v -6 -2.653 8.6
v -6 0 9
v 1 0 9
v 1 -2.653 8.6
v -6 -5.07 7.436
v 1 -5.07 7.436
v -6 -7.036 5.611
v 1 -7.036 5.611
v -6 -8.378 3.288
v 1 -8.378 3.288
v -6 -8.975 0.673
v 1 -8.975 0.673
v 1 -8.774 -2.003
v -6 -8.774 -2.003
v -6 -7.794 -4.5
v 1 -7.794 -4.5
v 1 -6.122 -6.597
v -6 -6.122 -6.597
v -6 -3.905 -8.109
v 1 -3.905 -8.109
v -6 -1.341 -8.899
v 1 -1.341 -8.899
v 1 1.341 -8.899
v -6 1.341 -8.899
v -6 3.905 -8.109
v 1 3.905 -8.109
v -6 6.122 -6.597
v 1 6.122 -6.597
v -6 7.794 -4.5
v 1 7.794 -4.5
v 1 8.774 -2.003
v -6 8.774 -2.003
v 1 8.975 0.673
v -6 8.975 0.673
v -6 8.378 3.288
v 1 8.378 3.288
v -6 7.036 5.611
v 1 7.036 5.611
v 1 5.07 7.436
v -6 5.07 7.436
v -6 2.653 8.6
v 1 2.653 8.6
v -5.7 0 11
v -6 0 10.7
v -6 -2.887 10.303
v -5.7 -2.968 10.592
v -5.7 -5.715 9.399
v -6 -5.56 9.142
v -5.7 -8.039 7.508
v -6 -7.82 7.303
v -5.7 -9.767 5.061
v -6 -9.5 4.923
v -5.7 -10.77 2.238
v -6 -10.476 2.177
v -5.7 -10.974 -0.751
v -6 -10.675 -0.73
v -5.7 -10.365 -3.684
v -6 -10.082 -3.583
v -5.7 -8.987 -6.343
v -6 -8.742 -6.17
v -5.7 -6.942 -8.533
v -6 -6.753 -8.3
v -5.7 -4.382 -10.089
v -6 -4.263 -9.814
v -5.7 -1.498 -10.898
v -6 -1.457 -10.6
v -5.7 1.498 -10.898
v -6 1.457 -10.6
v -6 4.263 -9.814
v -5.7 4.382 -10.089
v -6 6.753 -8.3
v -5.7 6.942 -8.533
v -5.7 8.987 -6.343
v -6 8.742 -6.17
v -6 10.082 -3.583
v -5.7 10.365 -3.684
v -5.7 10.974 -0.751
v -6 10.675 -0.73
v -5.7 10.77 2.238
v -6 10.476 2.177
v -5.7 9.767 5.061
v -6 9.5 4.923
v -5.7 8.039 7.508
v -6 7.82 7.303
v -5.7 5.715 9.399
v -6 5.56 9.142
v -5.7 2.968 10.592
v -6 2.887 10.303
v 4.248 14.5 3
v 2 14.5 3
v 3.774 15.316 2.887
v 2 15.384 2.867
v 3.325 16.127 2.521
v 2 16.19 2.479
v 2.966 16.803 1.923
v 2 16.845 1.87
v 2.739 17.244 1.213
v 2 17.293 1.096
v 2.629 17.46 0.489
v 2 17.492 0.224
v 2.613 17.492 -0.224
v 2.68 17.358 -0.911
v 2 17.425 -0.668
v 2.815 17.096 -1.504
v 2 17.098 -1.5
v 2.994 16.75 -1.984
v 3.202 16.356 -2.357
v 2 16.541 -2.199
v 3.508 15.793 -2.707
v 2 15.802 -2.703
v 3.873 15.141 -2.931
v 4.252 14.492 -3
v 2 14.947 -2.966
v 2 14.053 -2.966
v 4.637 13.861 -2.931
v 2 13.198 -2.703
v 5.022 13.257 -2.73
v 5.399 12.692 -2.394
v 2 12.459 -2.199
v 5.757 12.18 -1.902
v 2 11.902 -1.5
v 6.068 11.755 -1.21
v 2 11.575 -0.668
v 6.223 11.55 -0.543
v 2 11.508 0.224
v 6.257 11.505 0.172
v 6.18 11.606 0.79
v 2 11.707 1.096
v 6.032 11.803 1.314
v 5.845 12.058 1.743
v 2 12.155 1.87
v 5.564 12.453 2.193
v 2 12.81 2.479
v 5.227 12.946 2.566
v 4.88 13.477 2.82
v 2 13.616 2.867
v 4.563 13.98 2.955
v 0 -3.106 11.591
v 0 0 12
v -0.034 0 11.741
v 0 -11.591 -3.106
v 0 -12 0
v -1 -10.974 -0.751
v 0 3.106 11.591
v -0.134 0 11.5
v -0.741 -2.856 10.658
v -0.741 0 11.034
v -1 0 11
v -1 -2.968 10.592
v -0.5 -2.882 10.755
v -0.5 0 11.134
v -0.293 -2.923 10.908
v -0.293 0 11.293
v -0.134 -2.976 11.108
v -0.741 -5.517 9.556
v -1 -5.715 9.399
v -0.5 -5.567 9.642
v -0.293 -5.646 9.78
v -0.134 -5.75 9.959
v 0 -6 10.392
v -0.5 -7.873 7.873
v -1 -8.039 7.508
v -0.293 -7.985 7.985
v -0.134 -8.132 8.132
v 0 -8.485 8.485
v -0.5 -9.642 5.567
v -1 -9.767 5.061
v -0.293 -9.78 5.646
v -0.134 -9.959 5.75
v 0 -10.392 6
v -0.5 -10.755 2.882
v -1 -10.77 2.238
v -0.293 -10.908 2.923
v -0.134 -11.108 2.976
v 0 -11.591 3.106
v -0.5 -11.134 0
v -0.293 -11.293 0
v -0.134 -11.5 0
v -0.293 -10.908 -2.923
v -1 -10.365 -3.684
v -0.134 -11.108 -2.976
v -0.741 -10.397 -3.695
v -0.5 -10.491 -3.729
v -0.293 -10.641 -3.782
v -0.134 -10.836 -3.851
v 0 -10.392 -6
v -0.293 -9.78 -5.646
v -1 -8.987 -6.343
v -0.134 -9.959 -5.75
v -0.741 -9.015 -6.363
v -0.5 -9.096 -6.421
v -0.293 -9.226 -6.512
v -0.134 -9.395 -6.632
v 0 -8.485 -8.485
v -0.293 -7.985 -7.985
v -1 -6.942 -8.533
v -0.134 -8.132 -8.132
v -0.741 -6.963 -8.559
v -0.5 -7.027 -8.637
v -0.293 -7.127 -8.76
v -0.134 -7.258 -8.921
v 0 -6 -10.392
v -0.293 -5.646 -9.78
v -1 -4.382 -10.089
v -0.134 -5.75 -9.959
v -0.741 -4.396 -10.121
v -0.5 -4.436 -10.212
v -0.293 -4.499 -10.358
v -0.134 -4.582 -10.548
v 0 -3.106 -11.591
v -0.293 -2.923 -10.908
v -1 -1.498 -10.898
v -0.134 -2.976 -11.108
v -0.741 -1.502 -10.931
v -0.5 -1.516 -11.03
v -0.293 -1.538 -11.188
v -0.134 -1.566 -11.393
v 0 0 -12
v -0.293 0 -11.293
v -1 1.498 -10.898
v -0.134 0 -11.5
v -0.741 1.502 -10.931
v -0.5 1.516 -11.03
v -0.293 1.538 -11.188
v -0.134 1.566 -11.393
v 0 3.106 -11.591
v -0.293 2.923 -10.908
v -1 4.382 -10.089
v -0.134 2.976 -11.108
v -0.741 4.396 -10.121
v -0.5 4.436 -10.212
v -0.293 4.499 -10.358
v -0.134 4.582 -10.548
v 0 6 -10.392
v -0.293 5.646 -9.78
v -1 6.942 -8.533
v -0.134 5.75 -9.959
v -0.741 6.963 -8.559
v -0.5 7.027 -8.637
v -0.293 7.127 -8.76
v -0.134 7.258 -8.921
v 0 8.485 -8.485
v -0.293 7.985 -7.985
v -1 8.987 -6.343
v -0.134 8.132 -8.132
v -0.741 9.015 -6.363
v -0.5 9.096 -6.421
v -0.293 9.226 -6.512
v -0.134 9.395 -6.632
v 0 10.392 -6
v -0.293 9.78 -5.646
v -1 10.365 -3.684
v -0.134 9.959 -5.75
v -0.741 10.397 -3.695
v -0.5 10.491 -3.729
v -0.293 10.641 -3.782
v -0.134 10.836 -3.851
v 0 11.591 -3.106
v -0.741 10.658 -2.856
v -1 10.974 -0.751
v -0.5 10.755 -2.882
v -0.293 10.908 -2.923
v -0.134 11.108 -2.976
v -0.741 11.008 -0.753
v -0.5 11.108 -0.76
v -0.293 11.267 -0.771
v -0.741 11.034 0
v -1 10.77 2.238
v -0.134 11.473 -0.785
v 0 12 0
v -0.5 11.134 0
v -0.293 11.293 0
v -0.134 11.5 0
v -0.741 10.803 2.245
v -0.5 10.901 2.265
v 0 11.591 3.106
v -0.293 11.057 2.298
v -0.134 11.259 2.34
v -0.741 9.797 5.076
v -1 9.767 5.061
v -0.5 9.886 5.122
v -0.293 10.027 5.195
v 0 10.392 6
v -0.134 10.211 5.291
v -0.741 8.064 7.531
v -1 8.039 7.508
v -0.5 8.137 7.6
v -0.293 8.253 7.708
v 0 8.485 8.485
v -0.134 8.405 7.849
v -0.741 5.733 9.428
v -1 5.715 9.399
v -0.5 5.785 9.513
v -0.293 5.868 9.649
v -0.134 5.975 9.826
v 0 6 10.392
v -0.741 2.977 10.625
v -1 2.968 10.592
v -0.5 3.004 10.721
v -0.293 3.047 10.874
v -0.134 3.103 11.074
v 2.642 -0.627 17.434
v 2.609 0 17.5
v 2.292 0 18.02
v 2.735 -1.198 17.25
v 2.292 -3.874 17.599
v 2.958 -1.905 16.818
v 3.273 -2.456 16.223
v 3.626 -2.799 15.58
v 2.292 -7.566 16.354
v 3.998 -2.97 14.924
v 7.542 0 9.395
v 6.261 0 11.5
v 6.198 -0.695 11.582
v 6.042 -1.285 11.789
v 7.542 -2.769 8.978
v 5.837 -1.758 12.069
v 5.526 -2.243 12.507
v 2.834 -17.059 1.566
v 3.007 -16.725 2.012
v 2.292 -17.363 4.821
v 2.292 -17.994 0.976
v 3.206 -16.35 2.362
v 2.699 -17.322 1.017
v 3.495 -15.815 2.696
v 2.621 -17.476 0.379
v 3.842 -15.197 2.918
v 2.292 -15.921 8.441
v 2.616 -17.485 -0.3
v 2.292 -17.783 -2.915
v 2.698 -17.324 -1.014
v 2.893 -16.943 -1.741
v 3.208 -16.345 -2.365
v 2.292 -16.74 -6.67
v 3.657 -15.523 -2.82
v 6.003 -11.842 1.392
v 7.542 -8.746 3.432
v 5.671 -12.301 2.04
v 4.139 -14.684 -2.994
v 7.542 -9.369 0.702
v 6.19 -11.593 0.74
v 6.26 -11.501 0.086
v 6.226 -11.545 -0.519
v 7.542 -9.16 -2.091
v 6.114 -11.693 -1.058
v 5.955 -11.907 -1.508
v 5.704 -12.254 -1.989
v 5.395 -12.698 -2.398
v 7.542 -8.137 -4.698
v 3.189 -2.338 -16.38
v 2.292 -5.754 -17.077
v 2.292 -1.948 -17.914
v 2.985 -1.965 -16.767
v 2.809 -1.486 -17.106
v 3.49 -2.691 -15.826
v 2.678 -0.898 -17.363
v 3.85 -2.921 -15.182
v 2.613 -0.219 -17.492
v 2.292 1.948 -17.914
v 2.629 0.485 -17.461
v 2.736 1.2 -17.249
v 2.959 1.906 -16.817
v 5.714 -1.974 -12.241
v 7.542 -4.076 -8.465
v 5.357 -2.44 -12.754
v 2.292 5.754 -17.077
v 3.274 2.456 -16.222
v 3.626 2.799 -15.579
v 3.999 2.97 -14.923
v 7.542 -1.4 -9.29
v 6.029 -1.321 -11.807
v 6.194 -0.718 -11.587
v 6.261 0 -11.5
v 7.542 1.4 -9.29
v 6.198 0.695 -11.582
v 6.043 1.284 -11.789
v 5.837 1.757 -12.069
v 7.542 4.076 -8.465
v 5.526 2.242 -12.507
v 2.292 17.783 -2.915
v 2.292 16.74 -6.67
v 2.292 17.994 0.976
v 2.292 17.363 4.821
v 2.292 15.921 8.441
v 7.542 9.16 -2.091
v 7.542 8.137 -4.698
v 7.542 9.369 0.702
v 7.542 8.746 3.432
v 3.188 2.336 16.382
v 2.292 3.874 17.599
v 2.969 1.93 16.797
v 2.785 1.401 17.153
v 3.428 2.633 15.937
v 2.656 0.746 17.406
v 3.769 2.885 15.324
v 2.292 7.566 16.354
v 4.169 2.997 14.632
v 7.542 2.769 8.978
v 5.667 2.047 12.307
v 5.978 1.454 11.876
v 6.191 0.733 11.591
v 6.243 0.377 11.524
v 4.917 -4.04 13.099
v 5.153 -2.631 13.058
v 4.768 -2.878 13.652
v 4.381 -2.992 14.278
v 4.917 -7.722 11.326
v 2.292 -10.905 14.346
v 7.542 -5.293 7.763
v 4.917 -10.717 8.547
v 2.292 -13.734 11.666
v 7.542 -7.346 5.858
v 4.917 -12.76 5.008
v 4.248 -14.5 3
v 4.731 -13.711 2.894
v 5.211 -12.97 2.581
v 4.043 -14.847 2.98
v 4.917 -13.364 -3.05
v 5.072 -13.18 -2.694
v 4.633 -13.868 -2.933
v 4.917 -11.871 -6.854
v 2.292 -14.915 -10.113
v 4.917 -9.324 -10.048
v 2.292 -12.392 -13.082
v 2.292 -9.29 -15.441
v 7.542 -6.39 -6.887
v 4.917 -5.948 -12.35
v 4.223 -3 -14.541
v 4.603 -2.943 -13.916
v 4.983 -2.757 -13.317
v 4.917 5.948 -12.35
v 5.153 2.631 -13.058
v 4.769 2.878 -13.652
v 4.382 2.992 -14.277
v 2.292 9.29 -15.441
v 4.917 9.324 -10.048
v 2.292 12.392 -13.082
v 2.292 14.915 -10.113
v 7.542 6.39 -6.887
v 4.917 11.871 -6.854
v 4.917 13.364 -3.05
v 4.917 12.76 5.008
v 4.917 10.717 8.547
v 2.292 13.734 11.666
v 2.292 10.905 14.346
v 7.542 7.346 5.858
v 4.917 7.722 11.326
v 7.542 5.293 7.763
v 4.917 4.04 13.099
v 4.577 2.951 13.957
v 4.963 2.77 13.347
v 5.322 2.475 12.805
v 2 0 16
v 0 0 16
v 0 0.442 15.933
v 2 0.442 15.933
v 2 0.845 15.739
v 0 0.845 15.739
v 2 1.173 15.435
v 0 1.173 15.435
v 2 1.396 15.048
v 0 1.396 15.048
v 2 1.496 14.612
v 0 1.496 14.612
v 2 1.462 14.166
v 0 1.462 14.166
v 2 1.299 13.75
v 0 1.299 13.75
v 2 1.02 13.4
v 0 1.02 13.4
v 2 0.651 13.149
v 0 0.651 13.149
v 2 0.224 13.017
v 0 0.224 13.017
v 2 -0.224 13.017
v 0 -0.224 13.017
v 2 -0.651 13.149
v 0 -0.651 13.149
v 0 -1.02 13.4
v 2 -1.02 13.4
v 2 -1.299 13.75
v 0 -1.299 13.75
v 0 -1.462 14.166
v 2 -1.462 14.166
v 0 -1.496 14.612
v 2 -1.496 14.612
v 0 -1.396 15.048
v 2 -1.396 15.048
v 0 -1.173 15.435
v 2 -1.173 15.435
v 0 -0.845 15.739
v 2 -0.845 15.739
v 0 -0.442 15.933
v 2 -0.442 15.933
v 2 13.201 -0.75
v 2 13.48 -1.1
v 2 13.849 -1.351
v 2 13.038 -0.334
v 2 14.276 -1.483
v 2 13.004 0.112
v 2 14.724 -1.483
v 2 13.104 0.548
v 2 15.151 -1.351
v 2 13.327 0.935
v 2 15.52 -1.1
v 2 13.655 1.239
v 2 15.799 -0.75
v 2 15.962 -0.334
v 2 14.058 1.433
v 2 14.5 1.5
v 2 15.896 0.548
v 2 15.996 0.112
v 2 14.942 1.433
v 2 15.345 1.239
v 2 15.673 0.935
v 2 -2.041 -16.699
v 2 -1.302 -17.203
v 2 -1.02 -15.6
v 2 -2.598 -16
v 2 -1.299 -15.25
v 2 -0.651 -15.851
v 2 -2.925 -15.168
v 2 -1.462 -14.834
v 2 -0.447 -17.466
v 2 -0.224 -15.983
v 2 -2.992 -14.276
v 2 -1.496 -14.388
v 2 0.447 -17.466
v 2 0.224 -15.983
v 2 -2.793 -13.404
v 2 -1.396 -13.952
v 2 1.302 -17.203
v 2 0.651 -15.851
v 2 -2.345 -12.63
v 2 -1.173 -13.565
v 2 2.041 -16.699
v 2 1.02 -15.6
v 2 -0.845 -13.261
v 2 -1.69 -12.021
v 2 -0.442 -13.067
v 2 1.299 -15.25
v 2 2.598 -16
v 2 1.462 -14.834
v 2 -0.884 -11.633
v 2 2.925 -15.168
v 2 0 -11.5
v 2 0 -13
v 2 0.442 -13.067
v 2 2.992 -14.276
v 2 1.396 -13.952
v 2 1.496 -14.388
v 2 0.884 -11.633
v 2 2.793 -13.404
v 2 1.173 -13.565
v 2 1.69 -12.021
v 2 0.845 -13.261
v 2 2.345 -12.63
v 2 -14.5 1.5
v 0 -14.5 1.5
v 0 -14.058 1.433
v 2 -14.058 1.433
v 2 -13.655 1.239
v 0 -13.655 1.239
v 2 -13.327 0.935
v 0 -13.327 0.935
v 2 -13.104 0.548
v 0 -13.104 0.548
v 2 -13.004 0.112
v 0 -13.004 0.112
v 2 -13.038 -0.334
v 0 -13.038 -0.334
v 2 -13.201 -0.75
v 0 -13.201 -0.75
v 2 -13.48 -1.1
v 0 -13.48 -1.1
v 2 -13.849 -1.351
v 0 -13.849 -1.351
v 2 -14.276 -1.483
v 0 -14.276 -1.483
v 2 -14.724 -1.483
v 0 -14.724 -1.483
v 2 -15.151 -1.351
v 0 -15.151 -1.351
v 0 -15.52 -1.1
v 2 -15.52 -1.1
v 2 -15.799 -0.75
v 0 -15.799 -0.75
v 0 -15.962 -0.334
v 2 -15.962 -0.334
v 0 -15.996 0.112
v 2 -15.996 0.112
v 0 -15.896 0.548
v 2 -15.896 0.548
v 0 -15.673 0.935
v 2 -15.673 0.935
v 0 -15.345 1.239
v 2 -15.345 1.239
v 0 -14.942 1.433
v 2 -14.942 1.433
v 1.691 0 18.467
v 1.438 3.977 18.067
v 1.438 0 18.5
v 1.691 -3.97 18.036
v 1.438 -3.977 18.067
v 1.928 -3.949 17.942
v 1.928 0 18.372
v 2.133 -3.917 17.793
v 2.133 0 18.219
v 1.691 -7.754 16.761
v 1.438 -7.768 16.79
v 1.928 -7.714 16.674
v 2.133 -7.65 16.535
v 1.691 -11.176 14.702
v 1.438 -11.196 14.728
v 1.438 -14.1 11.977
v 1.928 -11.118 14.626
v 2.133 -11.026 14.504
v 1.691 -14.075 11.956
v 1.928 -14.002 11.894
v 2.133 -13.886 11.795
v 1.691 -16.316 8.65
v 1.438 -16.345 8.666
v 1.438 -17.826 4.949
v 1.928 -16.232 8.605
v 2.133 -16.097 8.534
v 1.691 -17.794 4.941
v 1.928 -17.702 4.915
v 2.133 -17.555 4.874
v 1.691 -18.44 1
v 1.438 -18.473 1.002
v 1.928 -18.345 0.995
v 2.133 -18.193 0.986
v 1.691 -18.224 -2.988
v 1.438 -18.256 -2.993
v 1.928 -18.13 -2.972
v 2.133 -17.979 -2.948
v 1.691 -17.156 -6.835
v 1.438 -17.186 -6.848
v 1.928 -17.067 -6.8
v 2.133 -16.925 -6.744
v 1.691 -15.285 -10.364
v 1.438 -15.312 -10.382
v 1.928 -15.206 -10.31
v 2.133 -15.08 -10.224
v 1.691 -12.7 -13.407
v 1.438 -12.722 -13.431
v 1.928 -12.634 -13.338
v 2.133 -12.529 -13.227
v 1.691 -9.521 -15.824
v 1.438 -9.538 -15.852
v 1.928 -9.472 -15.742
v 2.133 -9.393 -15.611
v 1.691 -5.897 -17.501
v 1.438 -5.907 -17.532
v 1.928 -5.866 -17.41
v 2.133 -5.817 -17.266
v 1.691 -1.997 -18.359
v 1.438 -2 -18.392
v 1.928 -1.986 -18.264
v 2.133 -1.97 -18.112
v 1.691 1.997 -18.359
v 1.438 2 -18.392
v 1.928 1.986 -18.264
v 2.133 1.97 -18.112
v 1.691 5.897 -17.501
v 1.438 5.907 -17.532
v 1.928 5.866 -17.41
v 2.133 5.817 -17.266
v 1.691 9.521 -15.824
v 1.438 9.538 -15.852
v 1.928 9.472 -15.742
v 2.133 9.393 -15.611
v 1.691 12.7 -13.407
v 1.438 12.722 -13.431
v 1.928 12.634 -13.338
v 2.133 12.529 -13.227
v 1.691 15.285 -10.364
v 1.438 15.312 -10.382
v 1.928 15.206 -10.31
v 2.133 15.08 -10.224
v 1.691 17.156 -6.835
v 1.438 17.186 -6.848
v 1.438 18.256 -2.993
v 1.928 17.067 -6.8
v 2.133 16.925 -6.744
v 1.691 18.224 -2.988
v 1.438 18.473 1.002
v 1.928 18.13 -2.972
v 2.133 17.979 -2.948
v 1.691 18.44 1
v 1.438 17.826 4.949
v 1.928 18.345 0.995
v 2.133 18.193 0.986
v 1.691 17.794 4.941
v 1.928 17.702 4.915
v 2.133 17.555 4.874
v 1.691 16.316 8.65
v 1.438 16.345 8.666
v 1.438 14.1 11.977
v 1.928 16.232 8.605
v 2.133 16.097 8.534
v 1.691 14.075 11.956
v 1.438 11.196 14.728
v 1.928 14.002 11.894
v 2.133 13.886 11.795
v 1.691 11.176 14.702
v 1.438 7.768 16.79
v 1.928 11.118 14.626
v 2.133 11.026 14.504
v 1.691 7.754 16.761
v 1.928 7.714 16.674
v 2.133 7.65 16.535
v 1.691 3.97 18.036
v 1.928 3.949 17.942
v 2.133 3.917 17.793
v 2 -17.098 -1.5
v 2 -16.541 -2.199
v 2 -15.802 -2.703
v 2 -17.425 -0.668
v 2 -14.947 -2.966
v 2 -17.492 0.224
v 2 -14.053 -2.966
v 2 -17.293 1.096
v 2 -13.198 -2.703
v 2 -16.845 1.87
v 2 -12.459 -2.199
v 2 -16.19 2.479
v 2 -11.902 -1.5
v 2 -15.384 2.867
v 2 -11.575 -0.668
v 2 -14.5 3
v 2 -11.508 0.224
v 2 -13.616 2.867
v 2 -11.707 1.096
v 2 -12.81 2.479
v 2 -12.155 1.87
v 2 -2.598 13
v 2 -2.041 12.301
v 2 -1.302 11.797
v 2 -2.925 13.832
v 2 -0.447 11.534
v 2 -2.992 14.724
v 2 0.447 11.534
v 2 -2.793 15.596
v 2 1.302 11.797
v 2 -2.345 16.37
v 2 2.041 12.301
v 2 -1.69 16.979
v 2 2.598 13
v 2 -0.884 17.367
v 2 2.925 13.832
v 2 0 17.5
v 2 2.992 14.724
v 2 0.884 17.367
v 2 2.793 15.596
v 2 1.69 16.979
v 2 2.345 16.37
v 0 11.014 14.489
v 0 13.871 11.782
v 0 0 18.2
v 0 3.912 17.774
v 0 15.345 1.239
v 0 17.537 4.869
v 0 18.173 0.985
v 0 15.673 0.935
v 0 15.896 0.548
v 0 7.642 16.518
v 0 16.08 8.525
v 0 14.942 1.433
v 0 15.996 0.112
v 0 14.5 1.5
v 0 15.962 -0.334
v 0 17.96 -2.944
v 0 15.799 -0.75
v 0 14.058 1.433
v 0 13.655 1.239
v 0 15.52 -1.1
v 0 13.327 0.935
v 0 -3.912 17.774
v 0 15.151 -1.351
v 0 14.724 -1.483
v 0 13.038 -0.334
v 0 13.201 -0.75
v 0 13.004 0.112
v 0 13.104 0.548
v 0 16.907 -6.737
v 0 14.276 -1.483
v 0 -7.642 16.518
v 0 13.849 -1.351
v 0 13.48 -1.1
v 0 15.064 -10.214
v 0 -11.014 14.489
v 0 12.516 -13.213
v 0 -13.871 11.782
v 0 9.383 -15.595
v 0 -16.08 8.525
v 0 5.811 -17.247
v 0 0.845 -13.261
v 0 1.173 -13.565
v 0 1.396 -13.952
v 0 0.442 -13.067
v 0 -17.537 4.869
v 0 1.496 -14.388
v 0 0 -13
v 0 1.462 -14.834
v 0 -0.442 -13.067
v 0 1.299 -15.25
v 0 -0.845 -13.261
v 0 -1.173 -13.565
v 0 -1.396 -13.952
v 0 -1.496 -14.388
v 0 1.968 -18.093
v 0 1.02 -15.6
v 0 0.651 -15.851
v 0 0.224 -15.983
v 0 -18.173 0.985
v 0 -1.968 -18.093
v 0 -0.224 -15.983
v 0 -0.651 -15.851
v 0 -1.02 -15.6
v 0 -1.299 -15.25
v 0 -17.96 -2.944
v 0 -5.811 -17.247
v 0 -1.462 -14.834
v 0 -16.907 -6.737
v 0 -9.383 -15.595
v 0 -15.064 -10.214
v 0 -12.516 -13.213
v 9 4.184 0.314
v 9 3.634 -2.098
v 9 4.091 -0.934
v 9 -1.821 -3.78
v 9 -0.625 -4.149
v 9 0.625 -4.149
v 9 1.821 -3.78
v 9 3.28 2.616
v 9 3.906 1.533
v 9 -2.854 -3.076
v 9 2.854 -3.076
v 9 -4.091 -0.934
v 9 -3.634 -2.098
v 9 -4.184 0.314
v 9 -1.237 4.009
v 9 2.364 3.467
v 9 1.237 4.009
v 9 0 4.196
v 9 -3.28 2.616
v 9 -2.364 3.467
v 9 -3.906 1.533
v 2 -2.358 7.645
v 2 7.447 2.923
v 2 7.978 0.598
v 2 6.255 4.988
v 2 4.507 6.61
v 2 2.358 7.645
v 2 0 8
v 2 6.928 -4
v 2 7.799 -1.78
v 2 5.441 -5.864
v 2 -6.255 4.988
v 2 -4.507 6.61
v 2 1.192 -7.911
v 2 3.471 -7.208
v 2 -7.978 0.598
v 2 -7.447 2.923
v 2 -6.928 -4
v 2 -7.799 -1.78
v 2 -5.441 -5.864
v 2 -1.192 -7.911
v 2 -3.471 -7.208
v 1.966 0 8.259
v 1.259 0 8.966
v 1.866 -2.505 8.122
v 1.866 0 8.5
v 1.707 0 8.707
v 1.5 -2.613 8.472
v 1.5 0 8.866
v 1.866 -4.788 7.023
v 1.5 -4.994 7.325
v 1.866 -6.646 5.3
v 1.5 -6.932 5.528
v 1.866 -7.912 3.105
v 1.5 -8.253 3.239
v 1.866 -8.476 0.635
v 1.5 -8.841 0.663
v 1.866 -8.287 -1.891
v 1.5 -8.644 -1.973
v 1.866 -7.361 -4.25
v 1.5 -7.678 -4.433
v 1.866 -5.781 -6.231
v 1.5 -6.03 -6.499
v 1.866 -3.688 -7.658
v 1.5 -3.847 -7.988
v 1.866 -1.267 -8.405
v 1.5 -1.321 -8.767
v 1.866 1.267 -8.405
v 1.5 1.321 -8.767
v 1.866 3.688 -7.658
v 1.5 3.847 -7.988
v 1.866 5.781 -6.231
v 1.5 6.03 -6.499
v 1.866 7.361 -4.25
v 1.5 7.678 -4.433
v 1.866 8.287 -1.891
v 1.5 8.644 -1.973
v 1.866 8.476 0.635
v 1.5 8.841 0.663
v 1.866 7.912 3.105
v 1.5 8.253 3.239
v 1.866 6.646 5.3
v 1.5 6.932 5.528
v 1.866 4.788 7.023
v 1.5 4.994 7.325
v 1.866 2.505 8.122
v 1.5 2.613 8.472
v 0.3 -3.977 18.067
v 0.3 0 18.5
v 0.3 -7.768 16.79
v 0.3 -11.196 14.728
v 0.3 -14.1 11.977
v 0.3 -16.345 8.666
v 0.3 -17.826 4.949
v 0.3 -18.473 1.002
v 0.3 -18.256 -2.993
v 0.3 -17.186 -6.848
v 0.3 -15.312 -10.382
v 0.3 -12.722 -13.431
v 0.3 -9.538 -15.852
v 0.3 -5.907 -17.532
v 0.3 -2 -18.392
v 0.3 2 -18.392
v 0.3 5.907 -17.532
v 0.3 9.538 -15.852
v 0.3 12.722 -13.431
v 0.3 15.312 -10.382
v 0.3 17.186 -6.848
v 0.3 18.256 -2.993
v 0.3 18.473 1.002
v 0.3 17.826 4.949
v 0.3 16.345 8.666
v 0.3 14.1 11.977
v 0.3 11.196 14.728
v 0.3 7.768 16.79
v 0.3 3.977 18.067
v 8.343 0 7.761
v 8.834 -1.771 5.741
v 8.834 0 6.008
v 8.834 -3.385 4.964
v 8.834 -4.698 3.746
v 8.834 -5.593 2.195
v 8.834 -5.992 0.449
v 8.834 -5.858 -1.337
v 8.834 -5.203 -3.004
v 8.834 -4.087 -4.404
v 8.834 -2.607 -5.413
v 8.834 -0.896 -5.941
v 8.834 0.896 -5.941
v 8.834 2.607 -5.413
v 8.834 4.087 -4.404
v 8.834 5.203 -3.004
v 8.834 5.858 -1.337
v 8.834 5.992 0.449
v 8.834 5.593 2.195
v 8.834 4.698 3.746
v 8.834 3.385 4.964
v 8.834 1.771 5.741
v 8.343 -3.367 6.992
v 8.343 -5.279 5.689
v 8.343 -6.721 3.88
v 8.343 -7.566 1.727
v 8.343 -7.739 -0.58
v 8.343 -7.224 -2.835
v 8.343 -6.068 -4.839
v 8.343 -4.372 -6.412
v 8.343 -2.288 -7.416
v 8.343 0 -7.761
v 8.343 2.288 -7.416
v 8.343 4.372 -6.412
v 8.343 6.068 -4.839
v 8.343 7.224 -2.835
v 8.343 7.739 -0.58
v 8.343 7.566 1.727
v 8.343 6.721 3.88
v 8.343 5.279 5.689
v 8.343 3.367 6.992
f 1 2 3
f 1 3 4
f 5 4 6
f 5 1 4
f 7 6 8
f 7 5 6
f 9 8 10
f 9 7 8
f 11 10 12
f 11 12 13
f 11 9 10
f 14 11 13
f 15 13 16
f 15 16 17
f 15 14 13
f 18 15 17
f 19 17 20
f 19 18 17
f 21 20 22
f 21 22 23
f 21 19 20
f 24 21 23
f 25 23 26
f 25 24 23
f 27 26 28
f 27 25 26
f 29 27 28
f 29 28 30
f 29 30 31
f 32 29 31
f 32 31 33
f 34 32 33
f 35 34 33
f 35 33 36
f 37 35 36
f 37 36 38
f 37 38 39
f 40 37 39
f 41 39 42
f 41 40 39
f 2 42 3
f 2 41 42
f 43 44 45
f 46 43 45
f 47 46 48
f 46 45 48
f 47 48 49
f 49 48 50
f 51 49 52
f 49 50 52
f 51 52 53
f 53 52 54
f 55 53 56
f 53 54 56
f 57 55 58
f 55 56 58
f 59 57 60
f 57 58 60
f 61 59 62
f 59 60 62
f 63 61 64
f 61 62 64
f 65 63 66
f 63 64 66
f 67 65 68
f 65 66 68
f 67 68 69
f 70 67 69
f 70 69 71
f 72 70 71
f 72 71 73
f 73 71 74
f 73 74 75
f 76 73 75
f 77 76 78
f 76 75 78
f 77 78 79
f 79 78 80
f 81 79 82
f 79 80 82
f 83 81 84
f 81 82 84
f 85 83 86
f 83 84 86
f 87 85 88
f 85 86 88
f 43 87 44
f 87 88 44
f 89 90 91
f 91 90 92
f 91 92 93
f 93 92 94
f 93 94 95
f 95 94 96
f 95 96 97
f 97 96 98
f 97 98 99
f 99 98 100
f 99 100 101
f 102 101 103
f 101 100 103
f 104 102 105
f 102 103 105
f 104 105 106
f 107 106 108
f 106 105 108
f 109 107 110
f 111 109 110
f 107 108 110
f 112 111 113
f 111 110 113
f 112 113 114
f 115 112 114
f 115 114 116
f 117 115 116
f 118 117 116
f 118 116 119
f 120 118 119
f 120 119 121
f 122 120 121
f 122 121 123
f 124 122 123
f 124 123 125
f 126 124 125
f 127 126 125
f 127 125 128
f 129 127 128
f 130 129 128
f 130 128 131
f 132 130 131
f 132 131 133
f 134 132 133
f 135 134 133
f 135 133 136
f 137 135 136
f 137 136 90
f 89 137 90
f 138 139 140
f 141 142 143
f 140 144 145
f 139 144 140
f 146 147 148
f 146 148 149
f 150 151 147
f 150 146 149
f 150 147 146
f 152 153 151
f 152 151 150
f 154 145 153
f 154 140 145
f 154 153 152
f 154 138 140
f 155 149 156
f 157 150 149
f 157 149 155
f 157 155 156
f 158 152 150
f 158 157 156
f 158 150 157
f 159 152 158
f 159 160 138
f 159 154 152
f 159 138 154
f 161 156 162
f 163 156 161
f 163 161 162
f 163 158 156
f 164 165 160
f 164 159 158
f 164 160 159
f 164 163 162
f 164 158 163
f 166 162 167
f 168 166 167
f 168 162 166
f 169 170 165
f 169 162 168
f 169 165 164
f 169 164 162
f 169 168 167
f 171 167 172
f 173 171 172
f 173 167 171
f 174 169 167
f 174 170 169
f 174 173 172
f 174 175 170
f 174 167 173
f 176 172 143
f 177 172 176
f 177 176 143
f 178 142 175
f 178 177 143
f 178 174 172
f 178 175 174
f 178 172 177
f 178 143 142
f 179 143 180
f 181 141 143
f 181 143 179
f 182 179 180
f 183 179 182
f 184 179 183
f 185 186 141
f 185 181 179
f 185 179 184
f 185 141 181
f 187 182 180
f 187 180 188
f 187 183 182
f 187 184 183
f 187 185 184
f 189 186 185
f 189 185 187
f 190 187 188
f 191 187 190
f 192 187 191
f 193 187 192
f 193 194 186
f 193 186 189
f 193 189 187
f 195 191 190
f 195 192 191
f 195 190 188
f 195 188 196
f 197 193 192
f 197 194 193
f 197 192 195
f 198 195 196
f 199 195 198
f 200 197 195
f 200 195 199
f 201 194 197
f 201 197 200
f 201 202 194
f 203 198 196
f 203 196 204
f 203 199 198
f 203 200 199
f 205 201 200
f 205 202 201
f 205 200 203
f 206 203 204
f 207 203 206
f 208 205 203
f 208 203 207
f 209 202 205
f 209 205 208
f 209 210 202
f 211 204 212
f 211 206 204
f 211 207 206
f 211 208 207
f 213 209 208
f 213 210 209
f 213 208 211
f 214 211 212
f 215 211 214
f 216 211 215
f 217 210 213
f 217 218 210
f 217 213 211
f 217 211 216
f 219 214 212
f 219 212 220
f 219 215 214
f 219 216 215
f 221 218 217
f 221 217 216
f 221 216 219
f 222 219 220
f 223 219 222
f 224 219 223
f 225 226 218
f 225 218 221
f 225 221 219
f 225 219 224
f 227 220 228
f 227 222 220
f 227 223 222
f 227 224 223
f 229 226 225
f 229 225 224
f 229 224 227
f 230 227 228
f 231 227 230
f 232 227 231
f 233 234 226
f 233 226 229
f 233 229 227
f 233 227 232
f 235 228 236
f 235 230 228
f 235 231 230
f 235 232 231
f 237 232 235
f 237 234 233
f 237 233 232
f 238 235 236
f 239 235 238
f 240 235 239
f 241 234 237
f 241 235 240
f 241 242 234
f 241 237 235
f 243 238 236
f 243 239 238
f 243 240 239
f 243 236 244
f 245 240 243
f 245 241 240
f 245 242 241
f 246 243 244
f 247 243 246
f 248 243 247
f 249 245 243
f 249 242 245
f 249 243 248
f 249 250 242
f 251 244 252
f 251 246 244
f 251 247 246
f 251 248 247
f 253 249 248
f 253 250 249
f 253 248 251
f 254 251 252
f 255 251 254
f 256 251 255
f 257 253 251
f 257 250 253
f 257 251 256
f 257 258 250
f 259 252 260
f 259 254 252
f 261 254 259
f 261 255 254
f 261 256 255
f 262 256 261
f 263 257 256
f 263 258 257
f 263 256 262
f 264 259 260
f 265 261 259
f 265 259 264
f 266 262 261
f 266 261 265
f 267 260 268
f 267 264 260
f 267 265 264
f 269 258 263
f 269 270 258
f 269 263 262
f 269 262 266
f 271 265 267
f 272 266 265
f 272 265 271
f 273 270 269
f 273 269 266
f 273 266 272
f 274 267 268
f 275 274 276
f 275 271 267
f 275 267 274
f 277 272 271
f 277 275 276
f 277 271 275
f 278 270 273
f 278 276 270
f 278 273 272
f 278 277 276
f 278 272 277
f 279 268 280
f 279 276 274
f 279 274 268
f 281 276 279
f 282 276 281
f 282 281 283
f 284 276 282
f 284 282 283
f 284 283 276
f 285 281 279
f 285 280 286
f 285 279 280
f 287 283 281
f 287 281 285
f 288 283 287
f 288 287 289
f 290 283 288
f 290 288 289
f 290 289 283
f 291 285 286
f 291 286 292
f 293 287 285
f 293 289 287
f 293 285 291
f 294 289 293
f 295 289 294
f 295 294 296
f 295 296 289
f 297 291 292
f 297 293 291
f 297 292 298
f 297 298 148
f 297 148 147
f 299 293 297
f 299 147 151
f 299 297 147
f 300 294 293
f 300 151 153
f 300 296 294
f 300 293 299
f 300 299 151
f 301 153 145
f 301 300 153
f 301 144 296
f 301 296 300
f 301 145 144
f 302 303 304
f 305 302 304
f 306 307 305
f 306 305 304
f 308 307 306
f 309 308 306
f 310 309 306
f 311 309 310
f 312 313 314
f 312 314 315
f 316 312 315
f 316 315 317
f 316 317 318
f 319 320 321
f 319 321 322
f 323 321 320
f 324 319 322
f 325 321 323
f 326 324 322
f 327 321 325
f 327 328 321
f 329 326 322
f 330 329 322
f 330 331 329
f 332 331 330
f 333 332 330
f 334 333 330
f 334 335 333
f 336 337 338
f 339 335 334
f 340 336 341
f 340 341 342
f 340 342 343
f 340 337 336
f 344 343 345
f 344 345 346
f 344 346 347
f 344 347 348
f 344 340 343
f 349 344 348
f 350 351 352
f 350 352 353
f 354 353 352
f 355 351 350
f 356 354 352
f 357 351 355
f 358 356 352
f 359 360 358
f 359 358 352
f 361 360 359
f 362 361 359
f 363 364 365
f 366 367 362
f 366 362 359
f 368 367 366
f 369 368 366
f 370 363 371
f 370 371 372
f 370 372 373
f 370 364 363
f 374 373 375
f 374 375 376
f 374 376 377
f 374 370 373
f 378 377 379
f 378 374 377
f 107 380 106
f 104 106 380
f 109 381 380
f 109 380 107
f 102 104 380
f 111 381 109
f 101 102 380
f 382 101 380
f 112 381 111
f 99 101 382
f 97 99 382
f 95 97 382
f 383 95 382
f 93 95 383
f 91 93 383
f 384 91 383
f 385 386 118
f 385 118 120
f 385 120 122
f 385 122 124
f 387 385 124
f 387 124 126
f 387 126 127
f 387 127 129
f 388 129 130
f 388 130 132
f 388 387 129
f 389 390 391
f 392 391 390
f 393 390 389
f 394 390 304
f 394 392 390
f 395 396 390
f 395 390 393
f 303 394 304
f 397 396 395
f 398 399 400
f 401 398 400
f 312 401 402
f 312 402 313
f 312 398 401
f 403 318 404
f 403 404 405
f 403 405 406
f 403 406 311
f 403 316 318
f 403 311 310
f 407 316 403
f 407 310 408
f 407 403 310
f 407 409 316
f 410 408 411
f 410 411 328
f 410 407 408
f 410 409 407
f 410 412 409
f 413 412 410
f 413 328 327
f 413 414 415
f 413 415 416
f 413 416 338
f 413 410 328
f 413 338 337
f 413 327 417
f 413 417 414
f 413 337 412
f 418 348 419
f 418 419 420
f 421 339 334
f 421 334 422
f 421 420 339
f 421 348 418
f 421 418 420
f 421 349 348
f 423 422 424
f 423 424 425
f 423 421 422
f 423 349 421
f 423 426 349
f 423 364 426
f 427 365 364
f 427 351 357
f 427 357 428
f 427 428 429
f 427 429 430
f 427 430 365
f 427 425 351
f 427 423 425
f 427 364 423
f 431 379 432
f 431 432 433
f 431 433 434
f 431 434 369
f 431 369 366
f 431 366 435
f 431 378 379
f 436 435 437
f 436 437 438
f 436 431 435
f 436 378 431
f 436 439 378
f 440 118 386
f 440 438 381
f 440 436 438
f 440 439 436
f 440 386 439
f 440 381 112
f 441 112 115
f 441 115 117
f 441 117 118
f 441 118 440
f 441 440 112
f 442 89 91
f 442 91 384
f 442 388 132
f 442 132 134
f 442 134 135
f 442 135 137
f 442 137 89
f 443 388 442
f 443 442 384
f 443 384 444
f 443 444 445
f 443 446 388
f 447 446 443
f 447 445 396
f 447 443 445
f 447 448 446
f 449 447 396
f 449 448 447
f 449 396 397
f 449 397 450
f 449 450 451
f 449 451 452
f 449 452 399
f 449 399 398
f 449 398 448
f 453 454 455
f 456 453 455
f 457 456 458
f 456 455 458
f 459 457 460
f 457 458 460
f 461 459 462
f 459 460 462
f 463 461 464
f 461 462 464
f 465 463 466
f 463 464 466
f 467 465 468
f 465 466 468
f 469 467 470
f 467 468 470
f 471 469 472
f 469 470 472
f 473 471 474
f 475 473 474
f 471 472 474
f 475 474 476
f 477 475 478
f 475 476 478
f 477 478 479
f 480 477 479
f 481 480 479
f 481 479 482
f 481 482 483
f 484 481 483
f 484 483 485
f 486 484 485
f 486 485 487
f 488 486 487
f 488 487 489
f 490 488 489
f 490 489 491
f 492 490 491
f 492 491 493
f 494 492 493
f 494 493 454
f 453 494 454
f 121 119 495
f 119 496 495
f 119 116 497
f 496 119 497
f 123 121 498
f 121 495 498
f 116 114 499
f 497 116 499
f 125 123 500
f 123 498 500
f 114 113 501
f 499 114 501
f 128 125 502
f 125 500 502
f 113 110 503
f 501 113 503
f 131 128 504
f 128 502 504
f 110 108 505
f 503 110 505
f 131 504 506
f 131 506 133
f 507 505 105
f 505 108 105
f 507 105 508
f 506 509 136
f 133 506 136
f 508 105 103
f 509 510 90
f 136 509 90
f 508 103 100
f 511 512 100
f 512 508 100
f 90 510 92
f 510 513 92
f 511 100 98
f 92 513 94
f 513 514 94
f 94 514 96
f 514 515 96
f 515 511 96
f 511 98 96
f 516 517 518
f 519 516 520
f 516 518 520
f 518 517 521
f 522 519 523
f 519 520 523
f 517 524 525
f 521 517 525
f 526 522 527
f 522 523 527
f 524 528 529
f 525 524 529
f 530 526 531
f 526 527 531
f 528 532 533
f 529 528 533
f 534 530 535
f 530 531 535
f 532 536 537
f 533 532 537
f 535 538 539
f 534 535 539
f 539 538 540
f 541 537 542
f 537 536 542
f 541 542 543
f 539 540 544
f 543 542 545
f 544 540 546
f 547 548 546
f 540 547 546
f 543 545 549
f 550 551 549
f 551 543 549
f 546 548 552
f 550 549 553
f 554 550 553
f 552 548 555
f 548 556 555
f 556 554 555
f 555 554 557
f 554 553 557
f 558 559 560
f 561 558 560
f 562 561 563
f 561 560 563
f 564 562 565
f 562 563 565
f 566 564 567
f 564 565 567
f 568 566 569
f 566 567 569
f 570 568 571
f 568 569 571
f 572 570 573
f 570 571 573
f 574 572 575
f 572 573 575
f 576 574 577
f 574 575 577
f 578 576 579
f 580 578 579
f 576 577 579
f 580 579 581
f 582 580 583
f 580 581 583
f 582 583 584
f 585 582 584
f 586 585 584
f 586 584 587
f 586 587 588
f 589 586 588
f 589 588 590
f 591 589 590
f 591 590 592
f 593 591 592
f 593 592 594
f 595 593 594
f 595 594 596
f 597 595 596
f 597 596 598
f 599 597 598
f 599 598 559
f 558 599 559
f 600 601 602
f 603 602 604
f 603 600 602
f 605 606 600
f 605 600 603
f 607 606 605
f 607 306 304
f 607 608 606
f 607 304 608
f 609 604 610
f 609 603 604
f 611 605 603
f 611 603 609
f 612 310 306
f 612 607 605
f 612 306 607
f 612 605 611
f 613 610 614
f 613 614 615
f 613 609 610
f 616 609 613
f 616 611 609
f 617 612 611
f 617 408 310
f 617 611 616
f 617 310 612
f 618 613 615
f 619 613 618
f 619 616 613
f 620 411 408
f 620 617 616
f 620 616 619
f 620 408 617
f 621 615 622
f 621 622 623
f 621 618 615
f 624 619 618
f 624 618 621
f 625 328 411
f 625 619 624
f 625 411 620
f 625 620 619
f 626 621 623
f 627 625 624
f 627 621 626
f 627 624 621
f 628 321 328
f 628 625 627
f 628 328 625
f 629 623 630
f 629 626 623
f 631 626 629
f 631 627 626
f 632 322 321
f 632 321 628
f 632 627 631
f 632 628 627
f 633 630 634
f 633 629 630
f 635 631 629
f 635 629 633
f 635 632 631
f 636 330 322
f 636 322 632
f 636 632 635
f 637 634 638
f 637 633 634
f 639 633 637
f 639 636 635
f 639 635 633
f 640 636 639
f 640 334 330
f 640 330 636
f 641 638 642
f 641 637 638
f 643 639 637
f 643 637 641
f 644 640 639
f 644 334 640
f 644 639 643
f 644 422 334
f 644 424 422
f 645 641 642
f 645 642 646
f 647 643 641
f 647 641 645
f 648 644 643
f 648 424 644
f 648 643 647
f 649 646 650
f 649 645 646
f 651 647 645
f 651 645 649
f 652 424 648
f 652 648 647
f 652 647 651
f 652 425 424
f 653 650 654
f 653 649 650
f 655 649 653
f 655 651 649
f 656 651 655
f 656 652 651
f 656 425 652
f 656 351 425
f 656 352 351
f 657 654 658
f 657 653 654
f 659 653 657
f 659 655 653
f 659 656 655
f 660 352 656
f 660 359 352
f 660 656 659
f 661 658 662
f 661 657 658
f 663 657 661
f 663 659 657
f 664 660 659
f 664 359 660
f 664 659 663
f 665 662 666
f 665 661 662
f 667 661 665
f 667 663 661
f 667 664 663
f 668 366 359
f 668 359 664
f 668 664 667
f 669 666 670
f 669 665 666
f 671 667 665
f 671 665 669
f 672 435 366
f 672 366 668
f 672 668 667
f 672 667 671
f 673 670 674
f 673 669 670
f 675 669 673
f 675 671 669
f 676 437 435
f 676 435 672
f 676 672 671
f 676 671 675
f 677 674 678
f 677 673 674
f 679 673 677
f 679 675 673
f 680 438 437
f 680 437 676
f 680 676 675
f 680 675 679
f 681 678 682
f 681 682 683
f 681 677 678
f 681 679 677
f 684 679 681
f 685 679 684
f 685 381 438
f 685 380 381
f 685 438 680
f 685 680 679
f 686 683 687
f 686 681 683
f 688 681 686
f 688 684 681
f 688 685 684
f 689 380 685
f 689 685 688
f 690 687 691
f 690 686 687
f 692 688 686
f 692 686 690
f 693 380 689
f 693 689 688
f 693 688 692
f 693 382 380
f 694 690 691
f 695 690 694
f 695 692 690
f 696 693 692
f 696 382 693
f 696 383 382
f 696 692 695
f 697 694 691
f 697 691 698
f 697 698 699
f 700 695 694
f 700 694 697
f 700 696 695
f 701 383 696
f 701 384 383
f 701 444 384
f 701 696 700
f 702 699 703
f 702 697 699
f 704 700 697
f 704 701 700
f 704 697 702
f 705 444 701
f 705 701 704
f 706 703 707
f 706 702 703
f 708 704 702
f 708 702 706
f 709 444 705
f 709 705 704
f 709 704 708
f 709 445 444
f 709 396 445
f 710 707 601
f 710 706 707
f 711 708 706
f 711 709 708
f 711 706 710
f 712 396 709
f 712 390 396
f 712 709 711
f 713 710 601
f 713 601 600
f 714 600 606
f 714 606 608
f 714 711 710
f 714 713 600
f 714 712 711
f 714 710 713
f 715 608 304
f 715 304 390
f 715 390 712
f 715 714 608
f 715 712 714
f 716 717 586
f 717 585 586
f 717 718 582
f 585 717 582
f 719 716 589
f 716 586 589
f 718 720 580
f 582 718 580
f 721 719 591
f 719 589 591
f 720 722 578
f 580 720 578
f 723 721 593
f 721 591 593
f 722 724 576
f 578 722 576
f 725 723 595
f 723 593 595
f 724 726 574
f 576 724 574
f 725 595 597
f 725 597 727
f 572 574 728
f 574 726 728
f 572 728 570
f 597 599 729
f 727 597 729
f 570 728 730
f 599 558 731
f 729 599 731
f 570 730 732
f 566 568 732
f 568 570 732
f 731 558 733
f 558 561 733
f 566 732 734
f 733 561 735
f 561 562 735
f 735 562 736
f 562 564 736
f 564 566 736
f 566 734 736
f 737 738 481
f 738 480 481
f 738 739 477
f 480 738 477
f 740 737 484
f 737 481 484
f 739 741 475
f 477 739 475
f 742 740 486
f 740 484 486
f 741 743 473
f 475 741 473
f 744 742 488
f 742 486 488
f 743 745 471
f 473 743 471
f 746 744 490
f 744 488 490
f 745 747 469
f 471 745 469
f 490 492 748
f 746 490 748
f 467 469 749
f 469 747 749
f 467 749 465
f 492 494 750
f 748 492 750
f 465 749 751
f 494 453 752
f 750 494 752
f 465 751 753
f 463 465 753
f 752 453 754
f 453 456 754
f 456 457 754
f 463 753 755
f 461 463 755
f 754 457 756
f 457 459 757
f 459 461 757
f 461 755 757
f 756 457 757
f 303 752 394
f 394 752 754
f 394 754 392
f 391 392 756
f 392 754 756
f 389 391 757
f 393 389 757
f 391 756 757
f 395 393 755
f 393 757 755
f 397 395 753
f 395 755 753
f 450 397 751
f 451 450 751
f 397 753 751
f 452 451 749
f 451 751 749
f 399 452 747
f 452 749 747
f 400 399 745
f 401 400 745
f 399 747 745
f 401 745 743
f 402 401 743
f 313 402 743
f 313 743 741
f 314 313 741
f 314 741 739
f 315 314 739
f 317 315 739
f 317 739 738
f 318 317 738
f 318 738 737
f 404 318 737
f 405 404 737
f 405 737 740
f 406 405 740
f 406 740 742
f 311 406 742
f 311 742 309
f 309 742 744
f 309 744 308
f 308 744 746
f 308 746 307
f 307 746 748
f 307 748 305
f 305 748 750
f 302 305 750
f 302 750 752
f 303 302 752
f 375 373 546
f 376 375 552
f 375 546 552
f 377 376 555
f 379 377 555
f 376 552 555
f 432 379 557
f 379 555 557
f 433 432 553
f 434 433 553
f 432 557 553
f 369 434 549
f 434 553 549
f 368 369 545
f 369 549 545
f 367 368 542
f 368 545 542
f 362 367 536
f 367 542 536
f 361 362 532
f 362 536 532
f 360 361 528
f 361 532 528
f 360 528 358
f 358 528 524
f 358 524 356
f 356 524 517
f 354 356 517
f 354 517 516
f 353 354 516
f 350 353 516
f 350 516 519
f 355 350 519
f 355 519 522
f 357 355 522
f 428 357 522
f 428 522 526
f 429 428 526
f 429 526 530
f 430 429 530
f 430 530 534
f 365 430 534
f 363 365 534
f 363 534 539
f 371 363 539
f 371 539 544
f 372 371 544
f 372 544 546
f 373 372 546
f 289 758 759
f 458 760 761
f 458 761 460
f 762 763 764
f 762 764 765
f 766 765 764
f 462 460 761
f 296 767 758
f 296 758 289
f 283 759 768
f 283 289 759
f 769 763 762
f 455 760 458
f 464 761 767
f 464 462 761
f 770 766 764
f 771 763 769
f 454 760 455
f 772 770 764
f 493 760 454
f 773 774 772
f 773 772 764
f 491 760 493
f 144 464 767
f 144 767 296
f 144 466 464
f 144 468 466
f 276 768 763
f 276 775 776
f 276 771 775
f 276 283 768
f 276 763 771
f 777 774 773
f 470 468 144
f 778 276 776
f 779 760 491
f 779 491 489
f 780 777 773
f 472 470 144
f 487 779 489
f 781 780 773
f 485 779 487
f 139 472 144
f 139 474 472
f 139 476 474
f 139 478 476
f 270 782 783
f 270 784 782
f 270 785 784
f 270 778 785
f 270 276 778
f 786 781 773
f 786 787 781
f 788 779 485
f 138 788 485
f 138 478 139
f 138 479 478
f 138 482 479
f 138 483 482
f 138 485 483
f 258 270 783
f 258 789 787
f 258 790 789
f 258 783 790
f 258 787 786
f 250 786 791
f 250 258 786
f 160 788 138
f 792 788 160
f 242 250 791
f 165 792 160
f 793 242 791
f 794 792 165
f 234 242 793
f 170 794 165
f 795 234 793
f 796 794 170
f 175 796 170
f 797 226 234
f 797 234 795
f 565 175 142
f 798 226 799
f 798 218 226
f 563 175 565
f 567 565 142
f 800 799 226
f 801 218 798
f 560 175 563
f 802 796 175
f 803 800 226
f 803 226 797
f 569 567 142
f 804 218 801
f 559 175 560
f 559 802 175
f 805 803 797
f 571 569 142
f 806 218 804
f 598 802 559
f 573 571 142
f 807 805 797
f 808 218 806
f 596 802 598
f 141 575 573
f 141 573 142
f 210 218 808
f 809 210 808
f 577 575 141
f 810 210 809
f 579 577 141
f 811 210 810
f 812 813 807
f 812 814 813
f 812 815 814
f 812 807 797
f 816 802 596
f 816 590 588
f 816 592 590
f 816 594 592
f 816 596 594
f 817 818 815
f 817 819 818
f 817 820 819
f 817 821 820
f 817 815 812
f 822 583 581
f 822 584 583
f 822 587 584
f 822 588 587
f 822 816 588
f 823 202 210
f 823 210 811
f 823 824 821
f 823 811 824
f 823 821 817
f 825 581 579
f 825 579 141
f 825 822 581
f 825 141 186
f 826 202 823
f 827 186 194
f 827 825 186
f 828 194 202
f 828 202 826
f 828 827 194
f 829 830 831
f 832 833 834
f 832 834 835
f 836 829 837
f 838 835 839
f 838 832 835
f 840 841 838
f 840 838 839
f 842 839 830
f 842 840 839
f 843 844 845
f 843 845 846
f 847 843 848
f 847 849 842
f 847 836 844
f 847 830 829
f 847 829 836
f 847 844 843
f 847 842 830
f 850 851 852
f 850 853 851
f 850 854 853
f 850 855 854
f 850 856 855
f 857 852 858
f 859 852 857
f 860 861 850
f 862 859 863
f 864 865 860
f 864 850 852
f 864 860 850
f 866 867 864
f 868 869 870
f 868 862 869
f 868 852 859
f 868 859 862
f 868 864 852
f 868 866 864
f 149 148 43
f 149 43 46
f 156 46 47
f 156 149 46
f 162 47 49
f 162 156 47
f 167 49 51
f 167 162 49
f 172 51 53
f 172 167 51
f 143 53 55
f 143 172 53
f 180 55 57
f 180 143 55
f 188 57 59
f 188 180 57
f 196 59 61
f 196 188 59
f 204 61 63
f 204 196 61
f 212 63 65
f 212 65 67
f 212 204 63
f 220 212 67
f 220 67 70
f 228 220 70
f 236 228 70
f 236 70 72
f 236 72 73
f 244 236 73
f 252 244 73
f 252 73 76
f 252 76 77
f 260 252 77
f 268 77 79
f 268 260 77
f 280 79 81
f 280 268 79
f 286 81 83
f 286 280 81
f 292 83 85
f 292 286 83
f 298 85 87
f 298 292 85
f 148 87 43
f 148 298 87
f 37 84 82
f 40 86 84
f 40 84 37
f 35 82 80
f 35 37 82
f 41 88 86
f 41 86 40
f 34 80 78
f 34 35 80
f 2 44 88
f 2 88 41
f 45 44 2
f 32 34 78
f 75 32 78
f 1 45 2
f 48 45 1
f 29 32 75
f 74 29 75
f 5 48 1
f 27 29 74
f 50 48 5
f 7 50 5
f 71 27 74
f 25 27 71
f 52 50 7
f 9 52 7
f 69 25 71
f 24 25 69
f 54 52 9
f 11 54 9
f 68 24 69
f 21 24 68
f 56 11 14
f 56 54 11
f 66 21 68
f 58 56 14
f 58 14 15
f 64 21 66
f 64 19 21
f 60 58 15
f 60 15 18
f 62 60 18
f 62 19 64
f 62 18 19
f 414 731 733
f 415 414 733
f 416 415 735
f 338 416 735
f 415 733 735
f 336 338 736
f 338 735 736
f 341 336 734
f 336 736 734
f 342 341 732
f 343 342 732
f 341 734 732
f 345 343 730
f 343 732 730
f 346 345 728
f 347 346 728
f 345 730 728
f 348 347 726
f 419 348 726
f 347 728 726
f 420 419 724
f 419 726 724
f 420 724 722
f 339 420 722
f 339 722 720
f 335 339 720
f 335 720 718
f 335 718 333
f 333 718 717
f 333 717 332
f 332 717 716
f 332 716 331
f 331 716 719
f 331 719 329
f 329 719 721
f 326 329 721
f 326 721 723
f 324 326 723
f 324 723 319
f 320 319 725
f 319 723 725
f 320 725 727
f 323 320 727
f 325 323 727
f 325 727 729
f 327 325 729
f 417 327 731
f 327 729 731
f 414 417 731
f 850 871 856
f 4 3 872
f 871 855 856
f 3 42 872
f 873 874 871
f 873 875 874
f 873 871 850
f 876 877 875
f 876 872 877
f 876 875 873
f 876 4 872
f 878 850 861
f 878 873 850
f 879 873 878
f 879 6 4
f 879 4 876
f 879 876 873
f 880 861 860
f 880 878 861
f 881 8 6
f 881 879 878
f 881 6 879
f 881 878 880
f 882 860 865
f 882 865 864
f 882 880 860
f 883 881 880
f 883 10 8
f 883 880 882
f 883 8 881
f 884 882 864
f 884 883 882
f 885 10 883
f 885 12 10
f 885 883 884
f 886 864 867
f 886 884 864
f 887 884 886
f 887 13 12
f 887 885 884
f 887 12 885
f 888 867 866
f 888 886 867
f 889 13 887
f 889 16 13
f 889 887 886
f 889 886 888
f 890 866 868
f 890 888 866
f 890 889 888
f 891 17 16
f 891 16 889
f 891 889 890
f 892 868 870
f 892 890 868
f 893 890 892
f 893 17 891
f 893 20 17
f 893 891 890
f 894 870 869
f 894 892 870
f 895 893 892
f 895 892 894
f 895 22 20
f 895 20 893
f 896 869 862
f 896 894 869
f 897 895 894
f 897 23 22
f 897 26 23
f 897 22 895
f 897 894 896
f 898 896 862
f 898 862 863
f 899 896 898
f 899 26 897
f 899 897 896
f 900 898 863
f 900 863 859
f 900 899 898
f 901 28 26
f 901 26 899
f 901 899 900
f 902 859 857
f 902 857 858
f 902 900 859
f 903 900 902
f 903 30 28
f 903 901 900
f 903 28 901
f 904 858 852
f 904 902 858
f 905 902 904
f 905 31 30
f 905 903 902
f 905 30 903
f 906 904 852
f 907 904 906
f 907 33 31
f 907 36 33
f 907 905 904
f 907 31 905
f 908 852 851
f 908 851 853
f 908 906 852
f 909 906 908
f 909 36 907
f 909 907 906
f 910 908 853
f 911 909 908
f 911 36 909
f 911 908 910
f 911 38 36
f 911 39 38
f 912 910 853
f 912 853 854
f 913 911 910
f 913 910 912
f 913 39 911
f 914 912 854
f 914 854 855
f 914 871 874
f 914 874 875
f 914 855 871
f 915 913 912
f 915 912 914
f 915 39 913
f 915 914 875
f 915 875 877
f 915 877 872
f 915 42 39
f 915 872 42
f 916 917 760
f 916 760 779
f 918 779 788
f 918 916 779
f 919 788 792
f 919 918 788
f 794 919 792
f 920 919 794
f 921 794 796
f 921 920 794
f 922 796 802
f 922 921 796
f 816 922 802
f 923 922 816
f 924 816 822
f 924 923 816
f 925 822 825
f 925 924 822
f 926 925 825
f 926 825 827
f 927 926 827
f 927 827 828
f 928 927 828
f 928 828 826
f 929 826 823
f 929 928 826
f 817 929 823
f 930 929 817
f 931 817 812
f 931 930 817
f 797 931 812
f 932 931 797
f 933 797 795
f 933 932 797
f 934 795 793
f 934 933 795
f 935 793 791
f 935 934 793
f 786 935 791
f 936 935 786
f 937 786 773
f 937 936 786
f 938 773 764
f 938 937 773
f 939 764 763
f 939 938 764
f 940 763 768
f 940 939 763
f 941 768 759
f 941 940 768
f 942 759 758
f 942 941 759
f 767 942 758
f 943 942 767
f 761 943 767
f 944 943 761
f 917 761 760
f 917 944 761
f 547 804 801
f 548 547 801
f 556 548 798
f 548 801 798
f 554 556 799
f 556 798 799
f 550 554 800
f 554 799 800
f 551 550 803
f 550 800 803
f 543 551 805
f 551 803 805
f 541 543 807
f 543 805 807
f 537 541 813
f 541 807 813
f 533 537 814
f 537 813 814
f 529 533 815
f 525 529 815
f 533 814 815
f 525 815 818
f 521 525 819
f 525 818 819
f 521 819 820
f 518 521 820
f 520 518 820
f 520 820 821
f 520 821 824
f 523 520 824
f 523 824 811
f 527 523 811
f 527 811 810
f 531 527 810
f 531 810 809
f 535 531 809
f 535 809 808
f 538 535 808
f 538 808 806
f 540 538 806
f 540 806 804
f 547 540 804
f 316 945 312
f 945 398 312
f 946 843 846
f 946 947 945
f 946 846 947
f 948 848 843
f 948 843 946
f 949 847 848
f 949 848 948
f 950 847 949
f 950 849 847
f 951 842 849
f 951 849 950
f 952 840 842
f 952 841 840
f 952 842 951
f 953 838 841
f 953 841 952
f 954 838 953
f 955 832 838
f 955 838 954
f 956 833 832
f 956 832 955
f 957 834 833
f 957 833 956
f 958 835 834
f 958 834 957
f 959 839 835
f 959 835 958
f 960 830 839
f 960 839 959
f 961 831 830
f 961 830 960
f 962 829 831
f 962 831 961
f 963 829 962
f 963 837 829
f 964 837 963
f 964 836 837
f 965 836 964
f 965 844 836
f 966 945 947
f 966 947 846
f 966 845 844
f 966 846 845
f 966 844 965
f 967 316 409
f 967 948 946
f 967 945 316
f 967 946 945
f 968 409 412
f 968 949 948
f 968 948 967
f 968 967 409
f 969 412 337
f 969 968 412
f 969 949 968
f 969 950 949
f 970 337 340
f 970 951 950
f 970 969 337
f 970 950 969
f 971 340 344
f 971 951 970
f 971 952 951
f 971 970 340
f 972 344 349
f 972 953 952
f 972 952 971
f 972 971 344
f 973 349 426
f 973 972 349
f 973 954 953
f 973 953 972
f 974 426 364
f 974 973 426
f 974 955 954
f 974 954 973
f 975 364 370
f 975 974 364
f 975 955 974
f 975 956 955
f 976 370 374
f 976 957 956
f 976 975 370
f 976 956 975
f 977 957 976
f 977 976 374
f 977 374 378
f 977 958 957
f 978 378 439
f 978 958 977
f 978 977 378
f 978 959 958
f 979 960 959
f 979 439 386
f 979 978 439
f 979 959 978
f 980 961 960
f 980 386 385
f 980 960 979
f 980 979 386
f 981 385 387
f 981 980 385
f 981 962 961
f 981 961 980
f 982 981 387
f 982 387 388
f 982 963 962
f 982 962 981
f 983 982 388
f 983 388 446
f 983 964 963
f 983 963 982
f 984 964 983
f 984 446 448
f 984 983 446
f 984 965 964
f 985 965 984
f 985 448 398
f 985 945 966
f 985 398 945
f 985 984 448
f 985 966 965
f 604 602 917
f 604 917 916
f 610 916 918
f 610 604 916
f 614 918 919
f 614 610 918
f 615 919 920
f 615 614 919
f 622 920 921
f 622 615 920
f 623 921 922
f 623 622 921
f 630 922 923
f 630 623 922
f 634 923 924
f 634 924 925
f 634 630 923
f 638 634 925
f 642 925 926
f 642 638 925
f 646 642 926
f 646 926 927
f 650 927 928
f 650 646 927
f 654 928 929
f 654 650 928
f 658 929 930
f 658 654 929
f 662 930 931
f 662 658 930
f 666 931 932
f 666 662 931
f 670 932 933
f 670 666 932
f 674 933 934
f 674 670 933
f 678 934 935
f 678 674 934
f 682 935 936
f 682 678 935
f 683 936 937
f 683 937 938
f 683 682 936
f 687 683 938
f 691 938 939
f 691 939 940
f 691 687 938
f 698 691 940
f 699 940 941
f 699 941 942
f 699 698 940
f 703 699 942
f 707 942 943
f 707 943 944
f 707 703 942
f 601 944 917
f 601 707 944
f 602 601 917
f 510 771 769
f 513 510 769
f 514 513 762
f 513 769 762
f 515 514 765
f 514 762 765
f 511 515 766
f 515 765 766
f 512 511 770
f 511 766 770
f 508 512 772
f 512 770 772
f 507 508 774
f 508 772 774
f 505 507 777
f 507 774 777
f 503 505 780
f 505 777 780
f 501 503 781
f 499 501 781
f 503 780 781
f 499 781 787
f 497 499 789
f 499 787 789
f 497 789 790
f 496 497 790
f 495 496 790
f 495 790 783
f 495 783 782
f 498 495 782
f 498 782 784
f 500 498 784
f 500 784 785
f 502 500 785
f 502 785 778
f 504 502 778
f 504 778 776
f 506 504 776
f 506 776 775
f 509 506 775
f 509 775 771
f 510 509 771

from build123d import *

# Parameters (mm, degrees)
FILLET2_R          = 1
CHAMFER1_SIZE      = 0.3
SKETCH2_R          = 1.5
CUT_EXTRUDE1_DEPTH = 10
SKETCH3_R          = 3
CUT_EXTRUDE2_DEPTH = 10


with BuildPart() as part:
    # Sketch1 → Revolve1 (revolve)
    with BuildSketch(Plane.XY, mode=Mode.PRIVATE) as revolve1_sk:
        with BuildLine():
            Line((-6, 9), (-6, 11))
            Line((-6, 11), (0, 11))
            Line((0, 11), (0, 18.5))
            Line((0, 18.5), (1.438007651, 18.5))
            ThreePointArc((1.438007651, 18.5), (1.927932672, 18.371764575), (2.292206206, 18.019946947))
            Line((2.292206206, 18.019946947), (7.541985556, 9.395309443))
            ThreePointArc((7.541985556, 9.395309443), (8.628599471, 6.895853348), (9, 4.195839975))
            Line((9, 4.195839975), (9, 0))
            Line((9, 0), (2, 0))
            Line((2, 0), (2, 9))
            Line((2, 9), (-6, 9))
        make_face()
    revolve(revolve1_sk.sketch.rotate(Axis((0, 0, 0), (1, 0, 0)), 90), axis=Axis((0, 0, 0), (1, 0, 0)))

    # Fillet2
    fillet2_edges = [part.edges().sort_by_distance(p)[0] for p in [
        (0, 0, -11),
        (2, 0, -9),
    ]]
    fillet(fillet2_edges, radius=FILLET2_R)

    # Chamfer1
    chamfer1_edges = [part.edges().sort_by_distance(p)[0] for p in [
        (0, 0, -18.5),
        (-6, 0, -11),
    ]]
    chamfer(chamfer1_edges, length=CHAMFER1_SIZE)

    # Sketch2 → Cut-Extrude1 (cut)
    with BuildSketch(Plane.ZY):
        with Locations((0, 14.5)):
            Circle(SKETCH2_R)
        with Locations((14.5, 0)):
            Circle(SKETCH2_R)
        with Locations((0, -14.5)):
            Circle(SKETCH2_R)
        with Locations((-14.5, 0)):
            Circle(SKETCH2_R)
    extrude(amount=-CUT_EXTRUDE1_DEPTH, mode=Mode.SUBTRACT)

    # Sketch3 → Cut-Extrude2 (cut)
    with BuildSketch(Plane.ZY.offset(-2)):
        with Locations((0, 14.5)):
            Circle(SKETCH3_R)
        with Locations((14.5, 0)):
            Circle(SKETCH3_R)
        with Locations((0, -14.5)):
            Circle(SKETCH3_R)
        with Locations((-14.5, 0)):
            Circle(SKETCH3_R)
    extrude(amount=-CUT_EXTRUDE2_DEPTH, mode=Mode.SUBTRACT)


solid = part.part
